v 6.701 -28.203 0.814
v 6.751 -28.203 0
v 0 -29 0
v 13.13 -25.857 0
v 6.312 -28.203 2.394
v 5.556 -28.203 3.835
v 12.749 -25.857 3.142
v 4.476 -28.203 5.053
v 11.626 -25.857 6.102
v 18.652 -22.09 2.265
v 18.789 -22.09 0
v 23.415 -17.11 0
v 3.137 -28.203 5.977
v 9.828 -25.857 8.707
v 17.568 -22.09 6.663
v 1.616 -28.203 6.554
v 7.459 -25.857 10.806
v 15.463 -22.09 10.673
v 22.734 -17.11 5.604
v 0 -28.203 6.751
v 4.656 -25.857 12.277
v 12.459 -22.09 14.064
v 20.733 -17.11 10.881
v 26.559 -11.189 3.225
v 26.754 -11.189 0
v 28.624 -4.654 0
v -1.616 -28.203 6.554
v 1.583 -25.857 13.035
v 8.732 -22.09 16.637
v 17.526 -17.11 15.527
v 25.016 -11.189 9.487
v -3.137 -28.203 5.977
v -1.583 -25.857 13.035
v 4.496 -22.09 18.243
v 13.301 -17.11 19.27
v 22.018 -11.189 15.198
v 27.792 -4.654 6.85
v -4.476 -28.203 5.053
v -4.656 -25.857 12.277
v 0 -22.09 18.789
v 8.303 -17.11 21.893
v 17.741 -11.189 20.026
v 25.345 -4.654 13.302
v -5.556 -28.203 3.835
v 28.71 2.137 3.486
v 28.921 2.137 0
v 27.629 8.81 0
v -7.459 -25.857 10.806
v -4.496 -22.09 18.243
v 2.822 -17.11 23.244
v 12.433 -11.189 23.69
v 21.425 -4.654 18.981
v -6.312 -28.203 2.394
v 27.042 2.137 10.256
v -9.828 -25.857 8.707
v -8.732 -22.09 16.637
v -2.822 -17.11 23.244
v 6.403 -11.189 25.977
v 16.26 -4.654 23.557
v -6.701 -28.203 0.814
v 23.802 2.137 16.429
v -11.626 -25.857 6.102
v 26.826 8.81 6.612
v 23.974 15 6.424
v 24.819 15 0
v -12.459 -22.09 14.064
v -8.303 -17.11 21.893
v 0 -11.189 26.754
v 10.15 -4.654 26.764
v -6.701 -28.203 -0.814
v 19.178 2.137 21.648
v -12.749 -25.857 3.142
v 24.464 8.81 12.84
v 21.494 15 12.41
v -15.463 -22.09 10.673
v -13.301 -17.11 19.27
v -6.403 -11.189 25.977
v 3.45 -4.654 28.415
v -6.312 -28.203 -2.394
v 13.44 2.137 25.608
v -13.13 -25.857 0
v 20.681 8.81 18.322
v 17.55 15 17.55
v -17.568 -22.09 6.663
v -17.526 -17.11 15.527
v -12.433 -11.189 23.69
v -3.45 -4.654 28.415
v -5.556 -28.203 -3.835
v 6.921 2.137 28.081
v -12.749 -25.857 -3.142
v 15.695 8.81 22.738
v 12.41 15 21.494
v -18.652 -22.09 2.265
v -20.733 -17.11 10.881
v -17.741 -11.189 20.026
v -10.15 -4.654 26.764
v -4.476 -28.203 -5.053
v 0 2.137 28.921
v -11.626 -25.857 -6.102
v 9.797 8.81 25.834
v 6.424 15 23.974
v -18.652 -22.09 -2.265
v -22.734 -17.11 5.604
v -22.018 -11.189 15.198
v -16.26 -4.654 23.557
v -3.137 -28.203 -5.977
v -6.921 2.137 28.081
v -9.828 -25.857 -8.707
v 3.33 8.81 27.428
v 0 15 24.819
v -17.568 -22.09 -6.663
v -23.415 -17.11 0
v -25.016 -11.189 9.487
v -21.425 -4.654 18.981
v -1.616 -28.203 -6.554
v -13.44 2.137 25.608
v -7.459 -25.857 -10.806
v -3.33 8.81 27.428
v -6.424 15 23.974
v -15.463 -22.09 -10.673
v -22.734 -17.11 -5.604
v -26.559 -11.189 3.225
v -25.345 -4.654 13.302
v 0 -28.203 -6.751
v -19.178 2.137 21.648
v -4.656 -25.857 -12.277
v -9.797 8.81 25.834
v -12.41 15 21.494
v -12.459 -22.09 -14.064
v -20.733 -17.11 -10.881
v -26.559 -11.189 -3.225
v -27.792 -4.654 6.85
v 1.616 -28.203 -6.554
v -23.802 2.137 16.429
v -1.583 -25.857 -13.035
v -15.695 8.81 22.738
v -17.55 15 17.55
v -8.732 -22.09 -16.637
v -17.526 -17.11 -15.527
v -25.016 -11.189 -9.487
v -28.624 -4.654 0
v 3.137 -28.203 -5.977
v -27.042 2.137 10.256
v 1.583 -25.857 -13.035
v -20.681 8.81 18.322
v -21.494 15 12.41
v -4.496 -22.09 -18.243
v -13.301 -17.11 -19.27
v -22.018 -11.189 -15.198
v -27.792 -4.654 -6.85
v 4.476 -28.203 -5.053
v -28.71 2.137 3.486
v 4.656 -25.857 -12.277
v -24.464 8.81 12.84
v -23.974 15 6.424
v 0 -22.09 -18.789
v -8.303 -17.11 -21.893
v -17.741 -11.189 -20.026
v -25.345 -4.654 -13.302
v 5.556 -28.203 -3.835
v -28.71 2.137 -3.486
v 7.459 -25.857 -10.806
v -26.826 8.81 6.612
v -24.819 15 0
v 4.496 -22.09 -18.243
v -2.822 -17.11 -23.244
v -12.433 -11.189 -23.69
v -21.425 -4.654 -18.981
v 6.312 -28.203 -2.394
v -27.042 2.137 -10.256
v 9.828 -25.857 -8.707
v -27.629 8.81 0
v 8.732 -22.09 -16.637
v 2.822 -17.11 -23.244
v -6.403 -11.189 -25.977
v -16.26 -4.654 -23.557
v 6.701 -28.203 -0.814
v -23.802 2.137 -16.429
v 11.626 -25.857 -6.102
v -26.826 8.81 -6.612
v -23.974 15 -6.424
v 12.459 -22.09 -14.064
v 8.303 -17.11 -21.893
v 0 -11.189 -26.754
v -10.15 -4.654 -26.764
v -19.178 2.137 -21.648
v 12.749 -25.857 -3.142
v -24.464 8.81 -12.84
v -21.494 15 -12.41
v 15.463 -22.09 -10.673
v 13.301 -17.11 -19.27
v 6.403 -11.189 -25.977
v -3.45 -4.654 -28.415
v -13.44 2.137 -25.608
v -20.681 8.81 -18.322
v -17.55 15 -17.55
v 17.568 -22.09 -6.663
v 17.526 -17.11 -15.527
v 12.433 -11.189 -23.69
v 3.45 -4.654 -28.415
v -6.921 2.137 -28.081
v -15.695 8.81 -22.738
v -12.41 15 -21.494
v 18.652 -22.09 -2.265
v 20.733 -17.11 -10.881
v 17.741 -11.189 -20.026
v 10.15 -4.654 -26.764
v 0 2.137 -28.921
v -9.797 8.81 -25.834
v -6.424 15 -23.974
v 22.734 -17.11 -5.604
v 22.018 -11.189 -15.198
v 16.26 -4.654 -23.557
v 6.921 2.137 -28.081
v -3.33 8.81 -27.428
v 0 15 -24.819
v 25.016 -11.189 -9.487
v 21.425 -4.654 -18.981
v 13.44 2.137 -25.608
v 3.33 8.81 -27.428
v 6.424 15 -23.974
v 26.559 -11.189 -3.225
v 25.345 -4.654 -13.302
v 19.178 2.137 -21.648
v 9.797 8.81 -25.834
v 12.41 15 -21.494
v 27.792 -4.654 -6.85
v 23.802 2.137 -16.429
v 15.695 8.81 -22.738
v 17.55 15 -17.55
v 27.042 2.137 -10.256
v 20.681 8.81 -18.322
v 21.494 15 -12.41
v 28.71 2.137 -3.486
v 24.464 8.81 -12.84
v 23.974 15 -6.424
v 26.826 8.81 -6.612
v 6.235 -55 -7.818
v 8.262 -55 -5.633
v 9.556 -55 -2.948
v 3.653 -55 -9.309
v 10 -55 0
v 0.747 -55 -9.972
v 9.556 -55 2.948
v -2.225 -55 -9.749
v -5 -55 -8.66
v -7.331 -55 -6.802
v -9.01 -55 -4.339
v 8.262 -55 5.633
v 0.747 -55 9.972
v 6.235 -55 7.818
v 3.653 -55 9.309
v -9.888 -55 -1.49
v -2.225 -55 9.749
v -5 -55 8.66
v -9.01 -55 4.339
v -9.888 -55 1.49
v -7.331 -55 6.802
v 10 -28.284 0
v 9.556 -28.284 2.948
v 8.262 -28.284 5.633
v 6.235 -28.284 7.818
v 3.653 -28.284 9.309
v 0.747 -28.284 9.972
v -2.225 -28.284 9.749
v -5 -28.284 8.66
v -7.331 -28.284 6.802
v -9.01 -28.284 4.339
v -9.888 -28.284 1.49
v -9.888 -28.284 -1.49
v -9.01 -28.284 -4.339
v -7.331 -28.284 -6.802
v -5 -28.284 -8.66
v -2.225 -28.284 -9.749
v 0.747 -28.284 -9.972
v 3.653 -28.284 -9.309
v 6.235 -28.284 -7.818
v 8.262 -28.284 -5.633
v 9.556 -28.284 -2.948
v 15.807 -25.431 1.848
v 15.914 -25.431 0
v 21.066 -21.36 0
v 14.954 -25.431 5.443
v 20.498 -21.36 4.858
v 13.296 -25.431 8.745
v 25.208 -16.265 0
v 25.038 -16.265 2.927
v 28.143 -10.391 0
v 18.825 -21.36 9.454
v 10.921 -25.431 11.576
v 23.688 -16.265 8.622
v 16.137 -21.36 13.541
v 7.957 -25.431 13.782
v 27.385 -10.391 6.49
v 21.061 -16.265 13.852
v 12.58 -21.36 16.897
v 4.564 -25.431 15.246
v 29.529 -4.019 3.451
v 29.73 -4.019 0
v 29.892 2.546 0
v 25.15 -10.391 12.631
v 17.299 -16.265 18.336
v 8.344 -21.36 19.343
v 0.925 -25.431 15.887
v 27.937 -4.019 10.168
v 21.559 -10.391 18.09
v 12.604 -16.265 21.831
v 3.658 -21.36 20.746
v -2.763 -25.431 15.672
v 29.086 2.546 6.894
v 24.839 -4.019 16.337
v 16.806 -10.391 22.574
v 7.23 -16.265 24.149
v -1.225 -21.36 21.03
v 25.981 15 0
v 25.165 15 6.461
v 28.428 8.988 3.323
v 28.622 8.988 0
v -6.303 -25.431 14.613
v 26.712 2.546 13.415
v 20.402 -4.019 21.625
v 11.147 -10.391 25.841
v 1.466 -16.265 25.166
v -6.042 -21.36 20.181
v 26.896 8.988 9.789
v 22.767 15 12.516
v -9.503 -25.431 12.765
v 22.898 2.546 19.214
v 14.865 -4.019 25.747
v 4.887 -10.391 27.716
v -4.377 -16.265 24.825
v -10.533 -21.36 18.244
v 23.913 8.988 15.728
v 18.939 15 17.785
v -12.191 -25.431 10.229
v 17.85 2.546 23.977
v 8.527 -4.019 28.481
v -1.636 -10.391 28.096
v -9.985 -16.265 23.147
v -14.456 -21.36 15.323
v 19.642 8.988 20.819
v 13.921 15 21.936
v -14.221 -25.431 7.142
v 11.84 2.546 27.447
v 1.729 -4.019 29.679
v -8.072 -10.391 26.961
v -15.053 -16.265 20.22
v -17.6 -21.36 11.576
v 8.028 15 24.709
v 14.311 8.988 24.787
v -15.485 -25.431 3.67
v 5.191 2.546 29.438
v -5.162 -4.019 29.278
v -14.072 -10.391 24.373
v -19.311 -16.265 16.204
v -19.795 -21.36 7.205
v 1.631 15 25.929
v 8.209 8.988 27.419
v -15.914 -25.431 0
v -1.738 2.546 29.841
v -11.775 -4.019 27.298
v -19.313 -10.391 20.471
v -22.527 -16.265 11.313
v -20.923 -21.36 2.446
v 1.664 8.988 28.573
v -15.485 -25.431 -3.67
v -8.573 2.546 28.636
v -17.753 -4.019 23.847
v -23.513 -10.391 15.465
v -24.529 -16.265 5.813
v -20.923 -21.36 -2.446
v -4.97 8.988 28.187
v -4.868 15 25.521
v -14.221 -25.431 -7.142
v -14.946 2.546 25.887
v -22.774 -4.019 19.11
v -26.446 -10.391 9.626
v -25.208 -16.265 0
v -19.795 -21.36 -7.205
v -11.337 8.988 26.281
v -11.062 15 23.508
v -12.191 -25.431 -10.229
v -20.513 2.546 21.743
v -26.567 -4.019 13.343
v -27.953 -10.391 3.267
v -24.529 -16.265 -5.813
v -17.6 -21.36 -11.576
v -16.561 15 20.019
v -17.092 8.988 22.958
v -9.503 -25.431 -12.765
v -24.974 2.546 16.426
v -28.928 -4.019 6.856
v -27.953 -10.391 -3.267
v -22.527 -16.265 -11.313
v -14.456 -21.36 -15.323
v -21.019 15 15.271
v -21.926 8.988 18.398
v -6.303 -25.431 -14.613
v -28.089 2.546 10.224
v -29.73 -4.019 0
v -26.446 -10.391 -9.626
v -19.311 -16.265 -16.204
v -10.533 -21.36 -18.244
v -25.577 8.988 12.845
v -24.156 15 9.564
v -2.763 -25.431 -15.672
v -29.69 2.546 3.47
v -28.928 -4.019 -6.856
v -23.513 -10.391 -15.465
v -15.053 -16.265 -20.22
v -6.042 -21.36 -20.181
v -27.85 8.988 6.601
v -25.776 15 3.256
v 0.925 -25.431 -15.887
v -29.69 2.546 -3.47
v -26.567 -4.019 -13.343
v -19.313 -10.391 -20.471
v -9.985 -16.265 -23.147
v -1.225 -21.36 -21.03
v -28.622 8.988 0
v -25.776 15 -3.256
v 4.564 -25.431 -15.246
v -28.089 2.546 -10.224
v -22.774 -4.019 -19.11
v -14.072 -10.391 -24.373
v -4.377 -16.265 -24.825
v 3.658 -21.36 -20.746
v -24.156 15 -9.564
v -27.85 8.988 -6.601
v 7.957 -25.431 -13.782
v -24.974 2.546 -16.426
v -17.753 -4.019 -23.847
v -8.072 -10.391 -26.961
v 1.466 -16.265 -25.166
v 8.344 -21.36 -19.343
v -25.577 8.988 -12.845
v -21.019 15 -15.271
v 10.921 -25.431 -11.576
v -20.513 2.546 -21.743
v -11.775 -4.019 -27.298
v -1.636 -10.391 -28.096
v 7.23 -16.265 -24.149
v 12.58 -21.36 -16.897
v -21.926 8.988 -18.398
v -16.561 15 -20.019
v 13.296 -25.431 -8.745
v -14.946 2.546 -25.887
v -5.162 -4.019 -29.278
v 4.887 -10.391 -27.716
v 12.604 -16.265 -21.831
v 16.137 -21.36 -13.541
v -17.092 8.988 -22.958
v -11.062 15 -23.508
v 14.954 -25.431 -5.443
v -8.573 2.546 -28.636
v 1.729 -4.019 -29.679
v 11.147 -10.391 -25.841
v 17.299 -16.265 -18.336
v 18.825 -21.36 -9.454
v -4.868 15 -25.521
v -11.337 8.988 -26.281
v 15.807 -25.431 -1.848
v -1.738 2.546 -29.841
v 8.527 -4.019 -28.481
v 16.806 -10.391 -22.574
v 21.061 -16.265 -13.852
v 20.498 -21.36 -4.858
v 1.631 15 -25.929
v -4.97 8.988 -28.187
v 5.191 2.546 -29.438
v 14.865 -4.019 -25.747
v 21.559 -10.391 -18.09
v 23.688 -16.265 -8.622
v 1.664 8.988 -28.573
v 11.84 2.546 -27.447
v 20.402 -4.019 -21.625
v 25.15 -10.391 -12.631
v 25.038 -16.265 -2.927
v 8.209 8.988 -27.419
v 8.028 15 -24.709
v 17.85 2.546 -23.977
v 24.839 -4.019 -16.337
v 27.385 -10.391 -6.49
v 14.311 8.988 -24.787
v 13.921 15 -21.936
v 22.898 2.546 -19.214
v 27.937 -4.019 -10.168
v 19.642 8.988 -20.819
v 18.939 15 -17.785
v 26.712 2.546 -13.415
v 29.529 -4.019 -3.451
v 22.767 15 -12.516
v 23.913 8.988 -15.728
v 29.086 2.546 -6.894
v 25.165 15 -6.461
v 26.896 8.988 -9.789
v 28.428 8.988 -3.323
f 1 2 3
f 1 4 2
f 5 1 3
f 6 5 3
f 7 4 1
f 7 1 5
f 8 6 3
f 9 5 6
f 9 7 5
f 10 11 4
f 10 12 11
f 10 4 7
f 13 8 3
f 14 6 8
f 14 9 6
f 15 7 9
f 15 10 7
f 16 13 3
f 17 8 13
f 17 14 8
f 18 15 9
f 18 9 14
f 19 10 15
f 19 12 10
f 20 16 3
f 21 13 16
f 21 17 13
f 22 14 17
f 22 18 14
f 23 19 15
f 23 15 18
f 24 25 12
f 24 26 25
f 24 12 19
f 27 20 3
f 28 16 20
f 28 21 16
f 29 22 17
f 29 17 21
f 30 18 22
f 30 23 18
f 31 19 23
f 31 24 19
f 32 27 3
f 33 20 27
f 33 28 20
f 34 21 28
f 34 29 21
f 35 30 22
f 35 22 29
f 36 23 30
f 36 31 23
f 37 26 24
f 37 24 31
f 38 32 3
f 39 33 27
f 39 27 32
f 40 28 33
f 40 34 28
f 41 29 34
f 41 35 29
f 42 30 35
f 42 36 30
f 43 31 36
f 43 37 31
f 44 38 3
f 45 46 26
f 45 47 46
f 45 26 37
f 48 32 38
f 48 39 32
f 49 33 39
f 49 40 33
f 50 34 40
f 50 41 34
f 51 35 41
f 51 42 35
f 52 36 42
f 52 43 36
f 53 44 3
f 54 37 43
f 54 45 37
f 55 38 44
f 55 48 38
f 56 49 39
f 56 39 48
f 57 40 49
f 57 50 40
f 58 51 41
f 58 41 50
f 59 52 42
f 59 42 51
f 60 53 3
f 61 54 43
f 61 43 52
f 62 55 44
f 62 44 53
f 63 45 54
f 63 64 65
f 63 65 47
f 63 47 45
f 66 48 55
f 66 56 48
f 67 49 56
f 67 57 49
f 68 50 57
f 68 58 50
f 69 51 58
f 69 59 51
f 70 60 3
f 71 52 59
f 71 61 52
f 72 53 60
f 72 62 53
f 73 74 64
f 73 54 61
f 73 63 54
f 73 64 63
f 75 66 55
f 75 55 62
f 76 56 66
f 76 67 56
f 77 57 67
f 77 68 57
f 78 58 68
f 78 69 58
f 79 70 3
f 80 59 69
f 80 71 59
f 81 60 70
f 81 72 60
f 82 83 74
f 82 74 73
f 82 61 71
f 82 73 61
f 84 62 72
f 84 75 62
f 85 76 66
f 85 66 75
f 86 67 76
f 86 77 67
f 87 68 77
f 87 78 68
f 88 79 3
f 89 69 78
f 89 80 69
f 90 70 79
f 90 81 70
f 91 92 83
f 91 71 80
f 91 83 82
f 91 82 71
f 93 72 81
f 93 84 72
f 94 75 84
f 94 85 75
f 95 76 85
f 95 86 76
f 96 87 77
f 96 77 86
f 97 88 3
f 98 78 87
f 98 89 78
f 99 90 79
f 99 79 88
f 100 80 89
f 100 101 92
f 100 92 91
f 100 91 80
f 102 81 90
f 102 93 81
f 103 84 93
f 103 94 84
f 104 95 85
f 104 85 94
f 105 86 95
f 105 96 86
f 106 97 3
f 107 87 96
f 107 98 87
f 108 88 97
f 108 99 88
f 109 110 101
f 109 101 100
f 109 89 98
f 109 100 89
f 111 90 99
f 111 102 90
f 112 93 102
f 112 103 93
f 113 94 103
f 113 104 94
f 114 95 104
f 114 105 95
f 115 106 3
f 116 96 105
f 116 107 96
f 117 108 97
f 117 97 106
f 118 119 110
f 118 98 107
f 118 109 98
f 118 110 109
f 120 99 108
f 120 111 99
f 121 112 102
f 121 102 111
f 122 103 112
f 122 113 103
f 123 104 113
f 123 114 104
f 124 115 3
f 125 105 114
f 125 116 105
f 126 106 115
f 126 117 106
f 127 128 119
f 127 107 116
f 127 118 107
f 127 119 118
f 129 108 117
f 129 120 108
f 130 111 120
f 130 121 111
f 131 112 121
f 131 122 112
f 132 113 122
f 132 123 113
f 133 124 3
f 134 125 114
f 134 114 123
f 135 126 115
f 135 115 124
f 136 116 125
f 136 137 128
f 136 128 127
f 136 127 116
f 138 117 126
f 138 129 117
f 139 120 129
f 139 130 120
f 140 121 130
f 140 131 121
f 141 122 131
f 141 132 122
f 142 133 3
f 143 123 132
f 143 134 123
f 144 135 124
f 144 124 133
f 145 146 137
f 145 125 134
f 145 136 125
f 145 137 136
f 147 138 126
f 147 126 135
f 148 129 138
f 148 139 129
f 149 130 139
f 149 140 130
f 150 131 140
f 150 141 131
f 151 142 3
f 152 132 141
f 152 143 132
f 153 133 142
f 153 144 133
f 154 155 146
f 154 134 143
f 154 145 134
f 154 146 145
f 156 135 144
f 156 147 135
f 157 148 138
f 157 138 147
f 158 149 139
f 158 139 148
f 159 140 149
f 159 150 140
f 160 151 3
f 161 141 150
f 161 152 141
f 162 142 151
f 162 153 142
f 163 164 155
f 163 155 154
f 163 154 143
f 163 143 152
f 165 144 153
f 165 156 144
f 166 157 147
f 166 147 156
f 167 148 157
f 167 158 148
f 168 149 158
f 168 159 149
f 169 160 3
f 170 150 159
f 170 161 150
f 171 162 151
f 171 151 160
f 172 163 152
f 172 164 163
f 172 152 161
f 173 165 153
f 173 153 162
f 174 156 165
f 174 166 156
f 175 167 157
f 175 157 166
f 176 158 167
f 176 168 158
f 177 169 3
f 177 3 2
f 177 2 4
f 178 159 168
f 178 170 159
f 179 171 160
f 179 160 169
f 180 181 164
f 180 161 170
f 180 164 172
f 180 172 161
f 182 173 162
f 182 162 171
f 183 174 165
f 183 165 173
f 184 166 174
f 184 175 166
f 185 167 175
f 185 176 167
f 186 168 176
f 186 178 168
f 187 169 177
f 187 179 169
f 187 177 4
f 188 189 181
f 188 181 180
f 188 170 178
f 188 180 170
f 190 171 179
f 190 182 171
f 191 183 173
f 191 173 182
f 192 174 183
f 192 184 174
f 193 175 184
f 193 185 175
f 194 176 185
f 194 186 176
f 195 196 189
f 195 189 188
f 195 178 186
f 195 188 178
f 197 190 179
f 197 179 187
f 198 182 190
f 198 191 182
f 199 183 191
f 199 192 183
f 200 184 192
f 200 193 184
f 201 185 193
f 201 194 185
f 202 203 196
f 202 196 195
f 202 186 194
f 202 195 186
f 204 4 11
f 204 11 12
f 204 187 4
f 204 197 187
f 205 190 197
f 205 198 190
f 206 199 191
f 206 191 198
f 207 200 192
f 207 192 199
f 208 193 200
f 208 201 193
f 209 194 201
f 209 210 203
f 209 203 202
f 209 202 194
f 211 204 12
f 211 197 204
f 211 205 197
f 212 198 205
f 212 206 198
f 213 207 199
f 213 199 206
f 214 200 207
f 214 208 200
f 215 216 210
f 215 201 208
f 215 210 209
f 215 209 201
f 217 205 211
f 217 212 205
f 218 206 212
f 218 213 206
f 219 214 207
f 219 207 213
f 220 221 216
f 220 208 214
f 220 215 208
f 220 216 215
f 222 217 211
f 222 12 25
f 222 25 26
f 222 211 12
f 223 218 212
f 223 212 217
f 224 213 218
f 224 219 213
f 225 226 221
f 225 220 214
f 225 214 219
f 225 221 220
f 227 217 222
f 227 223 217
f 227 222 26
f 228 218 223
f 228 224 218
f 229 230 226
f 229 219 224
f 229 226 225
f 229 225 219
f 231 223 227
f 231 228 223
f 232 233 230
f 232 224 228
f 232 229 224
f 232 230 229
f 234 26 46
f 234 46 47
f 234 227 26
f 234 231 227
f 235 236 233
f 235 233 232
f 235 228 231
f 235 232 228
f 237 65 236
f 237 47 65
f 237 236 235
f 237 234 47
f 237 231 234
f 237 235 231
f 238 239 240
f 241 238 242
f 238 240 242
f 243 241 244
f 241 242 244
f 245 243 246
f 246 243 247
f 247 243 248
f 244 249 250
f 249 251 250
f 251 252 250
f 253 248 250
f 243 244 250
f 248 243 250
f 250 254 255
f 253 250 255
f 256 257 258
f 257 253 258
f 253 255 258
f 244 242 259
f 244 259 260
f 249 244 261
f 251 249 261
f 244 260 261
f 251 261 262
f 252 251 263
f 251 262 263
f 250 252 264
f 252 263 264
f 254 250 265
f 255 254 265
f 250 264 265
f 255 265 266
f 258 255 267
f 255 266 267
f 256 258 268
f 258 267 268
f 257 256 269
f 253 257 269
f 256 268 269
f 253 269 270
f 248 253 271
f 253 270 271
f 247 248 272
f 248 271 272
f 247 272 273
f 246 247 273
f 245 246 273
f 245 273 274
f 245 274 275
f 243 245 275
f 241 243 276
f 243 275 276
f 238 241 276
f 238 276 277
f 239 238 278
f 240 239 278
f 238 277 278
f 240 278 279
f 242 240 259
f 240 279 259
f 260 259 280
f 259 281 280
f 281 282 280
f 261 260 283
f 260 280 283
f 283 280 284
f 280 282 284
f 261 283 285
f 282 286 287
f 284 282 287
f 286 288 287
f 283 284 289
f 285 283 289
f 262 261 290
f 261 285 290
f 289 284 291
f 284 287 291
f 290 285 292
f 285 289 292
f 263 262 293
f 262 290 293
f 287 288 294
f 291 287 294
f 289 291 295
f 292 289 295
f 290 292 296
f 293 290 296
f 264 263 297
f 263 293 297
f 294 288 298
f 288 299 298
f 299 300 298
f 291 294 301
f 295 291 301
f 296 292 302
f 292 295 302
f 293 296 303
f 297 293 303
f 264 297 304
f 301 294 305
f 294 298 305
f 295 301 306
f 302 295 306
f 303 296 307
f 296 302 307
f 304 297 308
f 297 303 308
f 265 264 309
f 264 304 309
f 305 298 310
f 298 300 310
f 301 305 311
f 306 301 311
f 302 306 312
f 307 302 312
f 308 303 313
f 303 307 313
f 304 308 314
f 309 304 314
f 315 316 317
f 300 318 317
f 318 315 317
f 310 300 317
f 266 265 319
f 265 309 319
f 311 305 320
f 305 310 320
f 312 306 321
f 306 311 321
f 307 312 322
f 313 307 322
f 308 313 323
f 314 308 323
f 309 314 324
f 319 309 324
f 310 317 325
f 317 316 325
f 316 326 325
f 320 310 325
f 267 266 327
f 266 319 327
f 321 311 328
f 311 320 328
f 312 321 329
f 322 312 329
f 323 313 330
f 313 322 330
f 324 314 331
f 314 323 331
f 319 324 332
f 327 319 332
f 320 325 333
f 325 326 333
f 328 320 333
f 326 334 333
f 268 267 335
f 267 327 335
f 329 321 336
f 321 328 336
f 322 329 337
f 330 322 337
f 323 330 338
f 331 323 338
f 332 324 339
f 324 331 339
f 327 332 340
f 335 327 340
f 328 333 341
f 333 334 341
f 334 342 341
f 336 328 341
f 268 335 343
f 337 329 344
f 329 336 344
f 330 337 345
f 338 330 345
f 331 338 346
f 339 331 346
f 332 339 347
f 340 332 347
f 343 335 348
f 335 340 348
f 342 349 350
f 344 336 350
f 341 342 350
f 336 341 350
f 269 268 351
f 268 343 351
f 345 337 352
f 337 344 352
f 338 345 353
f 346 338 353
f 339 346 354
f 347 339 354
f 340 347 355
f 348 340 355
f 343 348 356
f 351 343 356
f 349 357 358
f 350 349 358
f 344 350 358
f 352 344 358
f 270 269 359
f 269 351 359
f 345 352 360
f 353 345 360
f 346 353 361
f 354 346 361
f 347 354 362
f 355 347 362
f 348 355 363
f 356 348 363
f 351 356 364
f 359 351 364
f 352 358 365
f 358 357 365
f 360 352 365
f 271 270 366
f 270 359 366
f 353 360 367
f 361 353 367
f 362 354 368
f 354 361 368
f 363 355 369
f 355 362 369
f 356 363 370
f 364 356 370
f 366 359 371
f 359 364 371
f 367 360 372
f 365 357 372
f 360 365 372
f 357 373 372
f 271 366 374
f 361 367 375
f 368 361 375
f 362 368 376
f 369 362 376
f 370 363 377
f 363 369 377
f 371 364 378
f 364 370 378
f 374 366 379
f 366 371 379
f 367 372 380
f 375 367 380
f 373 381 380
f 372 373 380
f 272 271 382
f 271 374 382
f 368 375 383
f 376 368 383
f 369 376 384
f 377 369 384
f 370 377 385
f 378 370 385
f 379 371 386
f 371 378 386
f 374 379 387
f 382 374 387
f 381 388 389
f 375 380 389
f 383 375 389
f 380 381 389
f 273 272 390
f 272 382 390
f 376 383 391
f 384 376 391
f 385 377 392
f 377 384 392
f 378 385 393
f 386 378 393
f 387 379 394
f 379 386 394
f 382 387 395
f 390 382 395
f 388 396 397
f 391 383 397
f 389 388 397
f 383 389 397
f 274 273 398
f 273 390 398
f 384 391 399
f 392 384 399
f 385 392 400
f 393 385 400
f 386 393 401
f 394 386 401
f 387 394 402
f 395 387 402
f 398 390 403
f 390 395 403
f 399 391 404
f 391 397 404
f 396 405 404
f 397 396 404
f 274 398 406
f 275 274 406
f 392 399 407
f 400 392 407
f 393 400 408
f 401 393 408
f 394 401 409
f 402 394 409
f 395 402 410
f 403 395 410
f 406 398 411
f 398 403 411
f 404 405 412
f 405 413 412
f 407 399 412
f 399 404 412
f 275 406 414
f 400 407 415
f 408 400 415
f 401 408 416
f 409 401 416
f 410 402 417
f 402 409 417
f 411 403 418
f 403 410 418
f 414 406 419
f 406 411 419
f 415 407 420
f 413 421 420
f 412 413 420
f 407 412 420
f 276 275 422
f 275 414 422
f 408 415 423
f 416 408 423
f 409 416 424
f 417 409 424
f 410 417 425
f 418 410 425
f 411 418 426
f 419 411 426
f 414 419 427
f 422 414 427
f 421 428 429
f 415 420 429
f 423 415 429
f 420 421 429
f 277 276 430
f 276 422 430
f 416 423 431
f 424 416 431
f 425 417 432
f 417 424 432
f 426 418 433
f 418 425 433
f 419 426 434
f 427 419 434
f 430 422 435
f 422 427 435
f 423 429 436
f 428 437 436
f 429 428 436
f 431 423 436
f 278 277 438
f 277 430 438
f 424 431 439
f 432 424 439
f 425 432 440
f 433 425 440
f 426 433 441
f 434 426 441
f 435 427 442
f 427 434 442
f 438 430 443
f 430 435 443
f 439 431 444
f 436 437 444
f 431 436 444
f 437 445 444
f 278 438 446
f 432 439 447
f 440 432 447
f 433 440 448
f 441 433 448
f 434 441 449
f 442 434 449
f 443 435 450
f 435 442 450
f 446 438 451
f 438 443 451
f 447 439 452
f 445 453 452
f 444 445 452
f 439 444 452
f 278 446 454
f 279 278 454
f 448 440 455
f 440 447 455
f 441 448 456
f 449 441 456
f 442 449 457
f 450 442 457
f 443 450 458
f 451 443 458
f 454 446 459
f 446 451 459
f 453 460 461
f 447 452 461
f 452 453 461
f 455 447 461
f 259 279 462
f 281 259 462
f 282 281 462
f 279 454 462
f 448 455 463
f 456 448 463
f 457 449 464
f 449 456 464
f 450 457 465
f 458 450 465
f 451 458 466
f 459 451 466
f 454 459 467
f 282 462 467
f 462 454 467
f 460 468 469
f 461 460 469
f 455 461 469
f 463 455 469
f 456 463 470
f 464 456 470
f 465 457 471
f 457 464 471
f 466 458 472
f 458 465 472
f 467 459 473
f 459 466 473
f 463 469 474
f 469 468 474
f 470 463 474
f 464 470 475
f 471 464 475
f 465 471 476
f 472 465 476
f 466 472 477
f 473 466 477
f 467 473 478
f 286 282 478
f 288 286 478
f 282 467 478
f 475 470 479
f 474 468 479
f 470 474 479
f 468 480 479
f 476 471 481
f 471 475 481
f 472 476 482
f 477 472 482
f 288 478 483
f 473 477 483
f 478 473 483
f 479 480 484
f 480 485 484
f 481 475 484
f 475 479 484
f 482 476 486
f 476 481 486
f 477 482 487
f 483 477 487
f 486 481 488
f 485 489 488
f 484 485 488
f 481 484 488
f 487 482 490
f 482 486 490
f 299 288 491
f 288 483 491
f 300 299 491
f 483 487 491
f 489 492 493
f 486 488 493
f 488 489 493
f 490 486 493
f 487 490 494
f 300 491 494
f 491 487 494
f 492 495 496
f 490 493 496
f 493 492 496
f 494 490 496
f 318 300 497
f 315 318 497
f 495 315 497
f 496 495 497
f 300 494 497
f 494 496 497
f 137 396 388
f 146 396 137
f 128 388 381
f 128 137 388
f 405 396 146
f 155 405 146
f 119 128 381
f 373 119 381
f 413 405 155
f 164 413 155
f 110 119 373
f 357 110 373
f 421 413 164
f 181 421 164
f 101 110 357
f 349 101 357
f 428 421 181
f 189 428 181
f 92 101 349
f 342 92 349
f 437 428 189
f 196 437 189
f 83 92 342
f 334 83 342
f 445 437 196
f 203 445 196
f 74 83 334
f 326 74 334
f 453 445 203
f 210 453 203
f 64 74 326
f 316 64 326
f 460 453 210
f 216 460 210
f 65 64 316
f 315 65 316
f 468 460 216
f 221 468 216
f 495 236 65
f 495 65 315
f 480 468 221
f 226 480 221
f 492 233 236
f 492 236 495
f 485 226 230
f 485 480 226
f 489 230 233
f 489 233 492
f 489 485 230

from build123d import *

# Parameters (mm, degrees)
CUT_EXTRUDE1_DEPTH      = 52.961524227
CUT_EXTRUDE1_DEPTH_BACK = 52.961524227
SHELL1_T                = -1


with BuildPart() as part:
    # Sketch1 → Revolve1 (revolve)
    with BuildSketch(Plane.XY):
        with BuildLine():
            Line((0, 30), (0, -30))
            ThreePointArc((0, -30), (30, 0), (0, 30))
        make_face()
    revolve(axis=Axis((0, 30, 0), (0, -1, 0)))

    # Sketch2 → Cut-Extrude1 (cut, two sides: drawn at the far end of the back side and taken through both)
    with BuildSketch(Plane.XY.offset(-CUT_EXTRUDE1_DEPTH_BACK)):
        Polygon((-219.842197388, 15), (-39.041394336, 15), (42.58256389, 15), (223.383366942, 15), (223.383366942, 376.601606104), (-219.842197388, 376.601606104), align=None)
    extrude(amount=CUT_EXTRUDE1_DEPTH + CUT_EXTRUDE1_DEPTH_BACK, mode=Mode.SUBTRACT)

    # Shell1
    shell1_openings = [part.faces().sort_by_distance(p)[0] for p in [
        (0, 15, 0),
    ]]
    offset(amount=SHELL1_T, openings=shell1_openings, kind=Kind.INTERSECTION)

    # Sketch3 → Revolve2 (revolve)
    with BuildSketch(Plane.XY):
        with BuildLine():
            Line((0, -30), (0, -55))
            Line((0, -55), (10, -55))
            Line((10, -55), (10, -28.284271247))
            ThreePointArc((10, -28.284271247), (5.073059362, -29.56795679), (0, -30))
        make_face()
    revolve(axis=Axis((0, -30, 0), (0, -1, 0)))


solid = part.part
